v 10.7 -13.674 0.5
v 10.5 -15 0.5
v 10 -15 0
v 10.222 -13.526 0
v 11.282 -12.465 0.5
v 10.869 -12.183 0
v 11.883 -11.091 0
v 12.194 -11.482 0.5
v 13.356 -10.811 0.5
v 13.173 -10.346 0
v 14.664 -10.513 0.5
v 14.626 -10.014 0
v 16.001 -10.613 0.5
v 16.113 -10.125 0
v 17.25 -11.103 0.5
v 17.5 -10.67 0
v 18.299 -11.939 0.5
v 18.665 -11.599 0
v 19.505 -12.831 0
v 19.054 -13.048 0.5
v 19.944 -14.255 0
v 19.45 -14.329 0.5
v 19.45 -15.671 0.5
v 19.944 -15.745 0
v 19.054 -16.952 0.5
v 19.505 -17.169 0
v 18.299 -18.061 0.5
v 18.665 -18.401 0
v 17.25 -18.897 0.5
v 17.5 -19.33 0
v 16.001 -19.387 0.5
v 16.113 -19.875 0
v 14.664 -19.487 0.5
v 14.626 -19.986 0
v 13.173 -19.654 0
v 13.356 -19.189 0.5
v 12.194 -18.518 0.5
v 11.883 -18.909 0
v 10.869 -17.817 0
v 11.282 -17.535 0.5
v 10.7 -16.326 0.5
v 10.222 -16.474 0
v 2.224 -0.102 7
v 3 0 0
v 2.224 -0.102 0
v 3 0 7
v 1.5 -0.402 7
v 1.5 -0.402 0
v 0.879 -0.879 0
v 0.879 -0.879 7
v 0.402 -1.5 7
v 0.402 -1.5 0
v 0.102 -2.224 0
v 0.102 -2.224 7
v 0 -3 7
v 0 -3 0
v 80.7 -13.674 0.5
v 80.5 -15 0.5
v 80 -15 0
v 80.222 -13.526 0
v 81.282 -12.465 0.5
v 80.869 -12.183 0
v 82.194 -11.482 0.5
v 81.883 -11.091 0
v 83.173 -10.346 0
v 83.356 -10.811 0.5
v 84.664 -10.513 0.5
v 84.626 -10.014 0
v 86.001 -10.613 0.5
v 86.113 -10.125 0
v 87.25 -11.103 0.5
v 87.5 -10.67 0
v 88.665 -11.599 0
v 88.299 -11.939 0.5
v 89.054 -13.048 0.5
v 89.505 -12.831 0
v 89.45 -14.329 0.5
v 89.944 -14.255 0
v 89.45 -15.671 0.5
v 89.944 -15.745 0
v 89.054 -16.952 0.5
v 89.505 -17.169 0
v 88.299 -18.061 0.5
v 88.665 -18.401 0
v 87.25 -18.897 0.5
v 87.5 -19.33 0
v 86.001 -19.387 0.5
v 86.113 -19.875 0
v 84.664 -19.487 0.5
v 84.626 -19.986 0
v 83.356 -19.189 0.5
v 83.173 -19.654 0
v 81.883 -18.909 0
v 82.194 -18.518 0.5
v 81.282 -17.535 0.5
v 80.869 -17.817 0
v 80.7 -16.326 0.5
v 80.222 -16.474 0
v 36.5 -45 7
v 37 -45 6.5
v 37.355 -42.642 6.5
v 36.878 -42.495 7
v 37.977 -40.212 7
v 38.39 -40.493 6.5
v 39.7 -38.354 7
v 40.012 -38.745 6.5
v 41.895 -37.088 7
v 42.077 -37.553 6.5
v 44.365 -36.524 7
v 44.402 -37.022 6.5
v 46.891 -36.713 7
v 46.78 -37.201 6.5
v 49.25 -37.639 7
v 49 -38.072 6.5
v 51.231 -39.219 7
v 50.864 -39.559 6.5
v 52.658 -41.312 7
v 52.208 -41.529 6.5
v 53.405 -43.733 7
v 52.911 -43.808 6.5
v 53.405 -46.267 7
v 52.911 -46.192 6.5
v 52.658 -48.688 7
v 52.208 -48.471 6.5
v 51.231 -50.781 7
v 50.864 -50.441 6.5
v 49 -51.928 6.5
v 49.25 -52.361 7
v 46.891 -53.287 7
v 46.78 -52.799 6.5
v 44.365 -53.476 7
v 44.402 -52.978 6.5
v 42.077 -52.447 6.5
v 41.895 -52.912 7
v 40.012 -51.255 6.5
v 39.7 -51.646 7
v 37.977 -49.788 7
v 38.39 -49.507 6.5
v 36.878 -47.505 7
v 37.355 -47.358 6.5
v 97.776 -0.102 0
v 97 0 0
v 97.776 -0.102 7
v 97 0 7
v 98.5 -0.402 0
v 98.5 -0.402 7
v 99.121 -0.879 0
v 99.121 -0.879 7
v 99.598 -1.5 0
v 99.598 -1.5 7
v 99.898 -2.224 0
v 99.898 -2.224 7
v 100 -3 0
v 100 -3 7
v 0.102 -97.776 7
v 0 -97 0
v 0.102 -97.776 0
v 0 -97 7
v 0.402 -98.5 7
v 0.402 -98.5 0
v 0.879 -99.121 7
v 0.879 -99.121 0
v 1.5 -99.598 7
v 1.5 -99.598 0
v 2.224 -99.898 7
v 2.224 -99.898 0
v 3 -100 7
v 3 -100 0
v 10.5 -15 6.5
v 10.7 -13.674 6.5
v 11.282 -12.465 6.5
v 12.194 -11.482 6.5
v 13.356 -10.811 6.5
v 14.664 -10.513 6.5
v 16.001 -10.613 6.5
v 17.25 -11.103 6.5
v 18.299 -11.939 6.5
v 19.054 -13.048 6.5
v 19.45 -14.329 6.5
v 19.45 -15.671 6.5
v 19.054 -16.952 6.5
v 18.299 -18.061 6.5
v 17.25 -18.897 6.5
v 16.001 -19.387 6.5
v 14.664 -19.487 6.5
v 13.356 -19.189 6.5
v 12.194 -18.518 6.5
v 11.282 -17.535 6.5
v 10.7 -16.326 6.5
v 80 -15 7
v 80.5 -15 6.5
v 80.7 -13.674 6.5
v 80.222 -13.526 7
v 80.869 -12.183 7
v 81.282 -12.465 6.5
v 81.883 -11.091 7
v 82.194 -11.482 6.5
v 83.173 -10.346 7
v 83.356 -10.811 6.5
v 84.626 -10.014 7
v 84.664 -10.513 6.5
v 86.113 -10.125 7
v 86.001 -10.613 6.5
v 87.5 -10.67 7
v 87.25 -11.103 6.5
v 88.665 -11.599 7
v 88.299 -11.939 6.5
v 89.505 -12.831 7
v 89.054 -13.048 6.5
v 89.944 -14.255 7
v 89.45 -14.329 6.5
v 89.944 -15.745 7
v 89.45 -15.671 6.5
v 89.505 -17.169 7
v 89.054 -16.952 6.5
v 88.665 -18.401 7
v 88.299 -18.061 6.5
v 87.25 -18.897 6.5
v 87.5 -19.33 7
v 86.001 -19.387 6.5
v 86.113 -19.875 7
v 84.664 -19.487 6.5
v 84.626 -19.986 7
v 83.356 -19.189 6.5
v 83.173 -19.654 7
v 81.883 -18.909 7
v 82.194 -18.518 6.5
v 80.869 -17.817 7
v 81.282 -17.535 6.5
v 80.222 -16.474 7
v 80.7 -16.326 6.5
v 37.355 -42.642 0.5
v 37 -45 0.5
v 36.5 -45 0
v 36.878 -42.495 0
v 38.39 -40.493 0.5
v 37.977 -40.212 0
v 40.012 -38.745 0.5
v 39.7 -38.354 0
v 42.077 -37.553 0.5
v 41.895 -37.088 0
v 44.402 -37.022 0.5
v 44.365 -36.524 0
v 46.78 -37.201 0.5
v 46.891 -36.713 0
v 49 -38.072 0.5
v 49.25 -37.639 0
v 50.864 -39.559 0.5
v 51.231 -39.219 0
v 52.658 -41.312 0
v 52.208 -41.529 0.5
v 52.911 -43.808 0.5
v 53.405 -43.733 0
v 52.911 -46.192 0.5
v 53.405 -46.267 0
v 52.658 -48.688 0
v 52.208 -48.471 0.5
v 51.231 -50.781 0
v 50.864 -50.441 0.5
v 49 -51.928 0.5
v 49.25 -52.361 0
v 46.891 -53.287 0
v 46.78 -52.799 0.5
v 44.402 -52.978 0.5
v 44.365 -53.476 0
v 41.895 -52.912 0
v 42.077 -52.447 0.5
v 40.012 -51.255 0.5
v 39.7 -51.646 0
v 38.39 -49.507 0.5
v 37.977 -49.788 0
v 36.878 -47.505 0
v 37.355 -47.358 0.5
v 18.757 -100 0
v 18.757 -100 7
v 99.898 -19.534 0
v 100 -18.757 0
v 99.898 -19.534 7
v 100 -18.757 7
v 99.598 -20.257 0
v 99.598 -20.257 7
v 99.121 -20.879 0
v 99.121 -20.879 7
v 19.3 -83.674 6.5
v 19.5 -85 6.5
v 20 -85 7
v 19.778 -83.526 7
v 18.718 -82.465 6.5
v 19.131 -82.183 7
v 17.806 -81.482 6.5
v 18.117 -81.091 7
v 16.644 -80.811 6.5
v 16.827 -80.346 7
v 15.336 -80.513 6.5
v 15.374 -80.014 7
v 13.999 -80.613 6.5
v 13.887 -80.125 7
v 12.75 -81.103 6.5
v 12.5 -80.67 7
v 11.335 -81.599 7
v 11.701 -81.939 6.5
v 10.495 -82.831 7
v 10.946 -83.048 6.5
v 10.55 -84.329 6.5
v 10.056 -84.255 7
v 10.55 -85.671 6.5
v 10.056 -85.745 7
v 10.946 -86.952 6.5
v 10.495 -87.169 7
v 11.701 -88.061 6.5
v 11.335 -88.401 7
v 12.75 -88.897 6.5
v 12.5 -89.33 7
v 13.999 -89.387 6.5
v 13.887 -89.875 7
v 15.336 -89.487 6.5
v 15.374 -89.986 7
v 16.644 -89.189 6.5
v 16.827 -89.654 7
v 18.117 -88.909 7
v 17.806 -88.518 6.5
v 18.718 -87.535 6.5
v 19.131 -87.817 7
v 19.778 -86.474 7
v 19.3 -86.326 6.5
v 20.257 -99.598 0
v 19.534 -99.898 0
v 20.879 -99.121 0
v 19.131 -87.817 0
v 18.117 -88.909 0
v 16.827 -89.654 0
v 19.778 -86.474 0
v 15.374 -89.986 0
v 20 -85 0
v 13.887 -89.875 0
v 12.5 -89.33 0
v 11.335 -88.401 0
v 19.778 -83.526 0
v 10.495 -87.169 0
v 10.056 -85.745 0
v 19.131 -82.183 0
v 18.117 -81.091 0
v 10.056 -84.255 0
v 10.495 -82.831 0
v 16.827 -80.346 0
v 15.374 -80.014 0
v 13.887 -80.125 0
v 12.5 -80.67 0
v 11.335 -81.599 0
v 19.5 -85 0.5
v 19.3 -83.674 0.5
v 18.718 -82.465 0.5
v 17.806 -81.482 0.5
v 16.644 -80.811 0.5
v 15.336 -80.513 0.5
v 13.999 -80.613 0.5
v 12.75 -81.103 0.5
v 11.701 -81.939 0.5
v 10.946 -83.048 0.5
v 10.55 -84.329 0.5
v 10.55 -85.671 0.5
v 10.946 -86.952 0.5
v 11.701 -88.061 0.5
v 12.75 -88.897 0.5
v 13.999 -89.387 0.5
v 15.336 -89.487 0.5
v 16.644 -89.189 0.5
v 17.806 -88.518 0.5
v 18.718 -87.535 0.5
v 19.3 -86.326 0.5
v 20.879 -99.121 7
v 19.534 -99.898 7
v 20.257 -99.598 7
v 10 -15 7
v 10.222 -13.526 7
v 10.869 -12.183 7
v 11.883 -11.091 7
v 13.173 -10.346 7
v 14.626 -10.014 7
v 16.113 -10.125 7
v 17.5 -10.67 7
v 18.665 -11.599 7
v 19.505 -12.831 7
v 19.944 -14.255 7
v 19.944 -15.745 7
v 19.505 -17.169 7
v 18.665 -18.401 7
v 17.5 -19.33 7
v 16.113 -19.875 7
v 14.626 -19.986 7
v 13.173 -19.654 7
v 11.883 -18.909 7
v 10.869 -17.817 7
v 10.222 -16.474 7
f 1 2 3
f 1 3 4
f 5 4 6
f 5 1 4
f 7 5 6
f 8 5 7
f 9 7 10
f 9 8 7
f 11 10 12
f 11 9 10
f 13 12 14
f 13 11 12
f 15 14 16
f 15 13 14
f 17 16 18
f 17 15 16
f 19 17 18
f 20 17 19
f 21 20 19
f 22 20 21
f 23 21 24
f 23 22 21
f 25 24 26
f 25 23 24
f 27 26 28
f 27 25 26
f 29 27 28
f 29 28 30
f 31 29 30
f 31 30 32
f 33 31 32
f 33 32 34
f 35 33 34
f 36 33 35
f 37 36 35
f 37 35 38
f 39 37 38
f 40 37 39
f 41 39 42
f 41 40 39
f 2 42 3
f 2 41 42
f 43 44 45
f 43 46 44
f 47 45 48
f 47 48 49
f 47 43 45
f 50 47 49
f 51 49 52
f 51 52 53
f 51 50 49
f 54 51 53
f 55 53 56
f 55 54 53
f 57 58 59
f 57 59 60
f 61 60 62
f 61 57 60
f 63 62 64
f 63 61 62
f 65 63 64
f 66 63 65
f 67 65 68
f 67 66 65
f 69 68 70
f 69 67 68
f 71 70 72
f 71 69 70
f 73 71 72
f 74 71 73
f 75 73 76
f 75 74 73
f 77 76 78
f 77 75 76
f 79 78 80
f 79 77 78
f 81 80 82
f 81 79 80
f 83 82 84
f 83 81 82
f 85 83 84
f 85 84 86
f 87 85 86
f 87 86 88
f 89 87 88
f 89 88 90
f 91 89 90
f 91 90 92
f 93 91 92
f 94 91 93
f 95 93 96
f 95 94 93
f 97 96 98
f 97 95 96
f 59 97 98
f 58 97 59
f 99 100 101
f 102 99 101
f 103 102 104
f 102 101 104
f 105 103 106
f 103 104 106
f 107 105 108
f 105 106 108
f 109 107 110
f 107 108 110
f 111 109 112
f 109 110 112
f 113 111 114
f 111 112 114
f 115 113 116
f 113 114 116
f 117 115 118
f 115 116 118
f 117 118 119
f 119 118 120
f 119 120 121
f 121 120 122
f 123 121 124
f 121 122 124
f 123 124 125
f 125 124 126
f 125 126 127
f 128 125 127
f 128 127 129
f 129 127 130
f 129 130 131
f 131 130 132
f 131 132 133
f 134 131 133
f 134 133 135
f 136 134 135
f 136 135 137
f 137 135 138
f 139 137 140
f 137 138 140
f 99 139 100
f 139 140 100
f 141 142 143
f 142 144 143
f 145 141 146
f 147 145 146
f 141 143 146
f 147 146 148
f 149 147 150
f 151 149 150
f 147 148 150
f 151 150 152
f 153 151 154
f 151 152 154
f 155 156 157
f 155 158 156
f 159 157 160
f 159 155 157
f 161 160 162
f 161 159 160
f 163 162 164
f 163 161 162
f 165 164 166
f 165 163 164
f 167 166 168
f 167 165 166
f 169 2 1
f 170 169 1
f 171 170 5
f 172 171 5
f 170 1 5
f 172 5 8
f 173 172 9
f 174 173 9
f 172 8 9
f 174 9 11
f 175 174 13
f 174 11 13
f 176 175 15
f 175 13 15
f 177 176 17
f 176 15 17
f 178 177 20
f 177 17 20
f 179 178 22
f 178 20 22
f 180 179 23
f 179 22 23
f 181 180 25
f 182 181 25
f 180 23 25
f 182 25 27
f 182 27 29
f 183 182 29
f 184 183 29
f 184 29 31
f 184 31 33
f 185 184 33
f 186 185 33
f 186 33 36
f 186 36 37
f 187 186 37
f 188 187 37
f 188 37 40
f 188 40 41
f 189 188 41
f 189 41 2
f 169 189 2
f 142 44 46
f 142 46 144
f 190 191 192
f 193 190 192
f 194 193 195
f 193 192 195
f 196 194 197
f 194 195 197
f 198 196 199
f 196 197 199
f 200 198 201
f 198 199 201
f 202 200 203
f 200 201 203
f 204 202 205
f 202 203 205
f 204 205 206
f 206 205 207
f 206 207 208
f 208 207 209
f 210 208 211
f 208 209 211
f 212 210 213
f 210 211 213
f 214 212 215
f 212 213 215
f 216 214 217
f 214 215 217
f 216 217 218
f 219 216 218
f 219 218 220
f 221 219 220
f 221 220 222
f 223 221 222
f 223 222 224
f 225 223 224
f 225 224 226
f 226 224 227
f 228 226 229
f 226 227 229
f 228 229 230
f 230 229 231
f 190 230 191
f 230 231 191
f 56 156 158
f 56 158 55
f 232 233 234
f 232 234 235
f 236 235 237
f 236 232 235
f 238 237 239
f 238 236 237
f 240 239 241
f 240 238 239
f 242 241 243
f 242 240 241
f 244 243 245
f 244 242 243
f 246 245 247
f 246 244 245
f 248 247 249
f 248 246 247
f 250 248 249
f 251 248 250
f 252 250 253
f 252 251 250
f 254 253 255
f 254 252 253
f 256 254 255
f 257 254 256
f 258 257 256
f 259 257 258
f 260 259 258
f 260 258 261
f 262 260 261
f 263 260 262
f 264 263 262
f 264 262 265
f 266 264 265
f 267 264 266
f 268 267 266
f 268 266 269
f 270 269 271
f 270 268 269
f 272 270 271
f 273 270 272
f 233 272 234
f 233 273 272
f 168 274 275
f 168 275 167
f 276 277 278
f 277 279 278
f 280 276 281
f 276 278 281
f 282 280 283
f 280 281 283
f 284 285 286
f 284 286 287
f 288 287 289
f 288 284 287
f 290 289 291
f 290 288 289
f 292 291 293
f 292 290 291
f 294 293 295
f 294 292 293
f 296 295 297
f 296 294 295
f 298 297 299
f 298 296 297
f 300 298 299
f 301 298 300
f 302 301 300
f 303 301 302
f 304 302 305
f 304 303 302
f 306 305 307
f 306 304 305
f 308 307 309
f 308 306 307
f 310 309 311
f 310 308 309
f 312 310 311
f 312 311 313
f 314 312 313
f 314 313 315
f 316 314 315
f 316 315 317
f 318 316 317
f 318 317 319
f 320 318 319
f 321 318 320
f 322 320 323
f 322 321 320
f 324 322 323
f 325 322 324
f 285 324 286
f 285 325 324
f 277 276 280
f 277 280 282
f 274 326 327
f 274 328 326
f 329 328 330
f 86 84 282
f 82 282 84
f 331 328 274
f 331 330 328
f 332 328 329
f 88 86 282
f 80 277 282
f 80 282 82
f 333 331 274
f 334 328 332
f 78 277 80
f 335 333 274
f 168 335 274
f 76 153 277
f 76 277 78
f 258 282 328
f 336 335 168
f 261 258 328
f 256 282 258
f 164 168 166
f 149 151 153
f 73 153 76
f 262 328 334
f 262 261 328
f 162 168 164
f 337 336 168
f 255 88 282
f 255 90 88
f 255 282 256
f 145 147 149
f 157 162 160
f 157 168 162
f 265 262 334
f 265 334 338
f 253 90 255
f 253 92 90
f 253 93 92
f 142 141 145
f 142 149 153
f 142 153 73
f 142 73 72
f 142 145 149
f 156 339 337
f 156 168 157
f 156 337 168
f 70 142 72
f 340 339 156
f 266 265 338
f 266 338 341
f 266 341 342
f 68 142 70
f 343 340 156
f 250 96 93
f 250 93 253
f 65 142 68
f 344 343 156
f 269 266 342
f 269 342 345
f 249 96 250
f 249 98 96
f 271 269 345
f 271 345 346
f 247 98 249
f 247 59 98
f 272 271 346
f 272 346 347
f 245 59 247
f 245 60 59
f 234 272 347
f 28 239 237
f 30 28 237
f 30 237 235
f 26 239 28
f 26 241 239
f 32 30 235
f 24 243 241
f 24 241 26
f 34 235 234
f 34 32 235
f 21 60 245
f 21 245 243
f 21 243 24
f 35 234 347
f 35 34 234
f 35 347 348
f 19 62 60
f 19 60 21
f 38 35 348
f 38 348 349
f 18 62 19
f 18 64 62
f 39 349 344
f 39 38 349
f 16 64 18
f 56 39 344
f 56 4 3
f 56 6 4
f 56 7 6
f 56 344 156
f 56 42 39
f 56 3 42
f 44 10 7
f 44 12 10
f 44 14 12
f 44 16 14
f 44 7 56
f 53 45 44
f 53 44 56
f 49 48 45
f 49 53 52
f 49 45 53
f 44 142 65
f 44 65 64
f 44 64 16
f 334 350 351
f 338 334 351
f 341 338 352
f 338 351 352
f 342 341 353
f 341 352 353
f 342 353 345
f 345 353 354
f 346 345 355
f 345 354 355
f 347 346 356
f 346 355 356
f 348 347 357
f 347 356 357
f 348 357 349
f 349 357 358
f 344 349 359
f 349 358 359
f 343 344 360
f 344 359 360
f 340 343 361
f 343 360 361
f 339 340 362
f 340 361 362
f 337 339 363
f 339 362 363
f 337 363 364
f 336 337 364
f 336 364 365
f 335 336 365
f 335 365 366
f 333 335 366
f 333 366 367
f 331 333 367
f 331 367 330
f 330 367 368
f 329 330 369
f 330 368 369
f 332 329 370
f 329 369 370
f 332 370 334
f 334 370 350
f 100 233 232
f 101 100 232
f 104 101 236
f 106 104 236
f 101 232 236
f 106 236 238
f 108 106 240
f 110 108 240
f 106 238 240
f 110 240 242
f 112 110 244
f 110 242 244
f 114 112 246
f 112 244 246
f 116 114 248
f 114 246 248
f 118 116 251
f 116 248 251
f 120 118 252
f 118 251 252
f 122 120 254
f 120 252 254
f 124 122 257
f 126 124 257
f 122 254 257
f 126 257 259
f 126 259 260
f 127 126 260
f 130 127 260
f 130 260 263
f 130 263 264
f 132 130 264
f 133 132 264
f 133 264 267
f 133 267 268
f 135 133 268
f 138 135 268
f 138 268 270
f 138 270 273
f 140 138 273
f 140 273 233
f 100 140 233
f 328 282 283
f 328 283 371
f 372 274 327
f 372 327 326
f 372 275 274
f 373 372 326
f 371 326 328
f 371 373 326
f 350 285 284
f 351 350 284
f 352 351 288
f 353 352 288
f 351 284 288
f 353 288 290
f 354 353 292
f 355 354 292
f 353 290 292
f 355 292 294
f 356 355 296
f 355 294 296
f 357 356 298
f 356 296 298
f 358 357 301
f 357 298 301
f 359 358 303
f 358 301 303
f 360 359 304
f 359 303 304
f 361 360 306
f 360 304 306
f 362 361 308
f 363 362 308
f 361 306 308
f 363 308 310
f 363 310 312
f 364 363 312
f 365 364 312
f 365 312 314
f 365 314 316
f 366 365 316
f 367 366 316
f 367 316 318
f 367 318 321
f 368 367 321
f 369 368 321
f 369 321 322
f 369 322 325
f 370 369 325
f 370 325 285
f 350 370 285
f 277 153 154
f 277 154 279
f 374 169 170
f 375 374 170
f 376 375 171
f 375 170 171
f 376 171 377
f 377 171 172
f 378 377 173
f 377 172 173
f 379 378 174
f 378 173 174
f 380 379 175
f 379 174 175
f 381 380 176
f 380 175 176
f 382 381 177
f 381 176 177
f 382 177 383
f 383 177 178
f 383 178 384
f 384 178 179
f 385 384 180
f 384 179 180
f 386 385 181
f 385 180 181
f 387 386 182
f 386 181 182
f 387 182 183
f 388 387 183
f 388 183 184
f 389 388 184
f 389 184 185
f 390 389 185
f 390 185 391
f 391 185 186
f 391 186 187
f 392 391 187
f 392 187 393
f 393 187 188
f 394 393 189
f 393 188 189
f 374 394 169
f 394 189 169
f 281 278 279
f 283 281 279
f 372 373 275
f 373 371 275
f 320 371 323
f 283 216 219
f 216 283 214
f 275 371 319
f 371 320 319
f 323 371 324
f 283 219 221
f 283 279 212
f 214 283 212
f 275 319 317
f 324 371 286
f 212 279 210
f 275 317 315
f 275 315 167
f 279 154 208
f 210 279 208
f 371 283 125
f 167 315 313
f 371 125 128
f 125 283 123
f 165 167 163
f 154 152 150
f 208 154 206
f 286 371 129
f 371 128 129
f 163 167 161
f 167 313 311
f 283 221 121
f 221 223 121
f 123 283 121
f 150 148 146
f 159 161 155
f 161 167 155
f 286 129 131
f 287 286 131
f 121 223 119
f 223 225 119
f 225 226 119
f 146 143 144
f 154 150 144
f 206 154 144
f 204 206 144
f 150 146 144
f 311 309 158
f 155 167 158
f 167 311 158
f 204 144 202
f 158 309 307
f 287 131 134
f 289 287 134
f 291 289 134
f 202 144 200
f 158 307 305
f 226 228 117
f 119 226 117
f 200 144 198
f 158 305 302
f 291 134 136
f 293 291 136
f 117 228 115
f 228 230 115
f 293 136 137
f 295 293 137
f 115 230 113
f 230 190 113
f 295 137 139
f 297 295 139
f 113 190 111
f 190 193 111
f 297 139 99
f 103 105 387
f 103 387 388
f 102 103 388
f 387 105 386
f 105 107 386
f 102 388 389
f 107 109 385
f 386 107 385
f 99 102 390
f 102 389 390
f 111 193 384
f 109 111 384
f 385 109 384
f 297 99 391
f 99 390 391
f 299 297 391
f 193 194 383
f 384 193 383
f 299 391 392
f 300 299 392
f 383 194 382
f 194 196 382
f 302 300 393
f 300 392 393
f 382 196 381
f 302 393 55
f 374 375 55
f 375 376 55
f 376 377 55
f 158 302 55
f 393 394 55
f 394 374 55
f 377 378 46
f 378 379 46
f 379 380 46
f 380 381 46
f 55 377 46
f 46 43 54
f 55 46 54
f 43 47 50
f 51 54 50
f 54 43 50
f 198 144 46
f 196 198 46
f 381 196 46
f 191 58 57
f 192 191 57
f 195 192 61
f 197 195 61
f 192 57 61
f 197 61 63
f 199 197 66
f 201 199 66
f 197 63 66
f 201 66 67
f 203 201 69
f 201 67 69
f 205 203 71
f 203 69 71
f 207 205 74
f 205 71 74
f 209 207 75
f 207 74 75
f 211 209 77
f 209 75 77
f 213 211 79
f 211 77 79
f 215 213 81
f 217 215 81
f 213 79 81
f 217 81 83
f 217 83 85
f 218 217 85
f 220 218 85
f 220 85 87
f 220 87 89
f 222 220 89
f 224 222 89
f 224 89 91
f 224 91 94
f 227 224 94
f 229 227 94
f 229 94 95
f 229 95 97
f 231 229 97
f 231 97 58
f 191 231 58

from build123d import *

# Parameters (mm, degrees)
BOSS_EXTRUDE1_DEPTH        = 7
F_9_0_9_DIAMETER_HOLE1_D   = 9
F_16_0_16_DIAMETER_HOLE1_D = 16
F_9_0_9_DIAMETER_HOLE2_D   = 9
CHAMFER1_SIZE              = 0.5
FILLET1_R                  = 3


with BuildPart() as part:
    # Sketch1 → Boss-Extrude1 (new body)
    with BuildSketch(Plane(origin=(0, 0, 0), x_dir=(-1, 0, 0), z_dir=(0, 0, -1))):
        Polygon((0, 0), (-100, 0), (-100, -20), (-20, -100), (0, -100), align=None)
    extrude(amount=-BOSS_EXTRUDE1_DEPTH)

    # Ø9.0 (9) Diameter Hole1 (through all)
    with Locations(Plane.XY.offset(7)):
        with Locations((85, -15), (15, -15)):
            Hole(F_9_0_9_DIAMETER_HOLE1_D / 2)

    # Ø16.0 (16) Diameter Hole1 (through all)
    with Locations(Plane.XY.offset(7)):
        with Locations((45, -45)):
            Hole(F_16_0_16_DIAMETER_HOLE1_D / 2)

    # Ø9.0 (9) Diameter Hole2 (through all)
    with Locations(Plane(origin=(0, 0, 0), x_dir=(-1, 0, 0), z_dir=(0, 0, -1))):
        with Locations((-15, -85)):
            Hole(F_9_0_9_DIAMETER_HOLE2_D / 2)

    # Chamfer1
    chamfer1_edges = [part.edges().sort_by_distance(p)[0] for p in [
        (19.5, -15, 7),
        (19.5, -15, 0),
        (89.5, -15, 7),
        (89.5, -15, 0),
        (53, -45, 7),
        (53, -45, 0),
        (10.5, -85, 0),
        (10.5, -85, 7),
    ]]
    chamfer(chamfer1_edges, length=CHAMFER1_SIZE)

    # Fillet1
    fillet1_edges = [part.edges().sort_by_distance(p)[0] for p in [
        (0, -100, 3.5),
        (20, -100, 3.5),
        (100, -20, 3.5),
        (100, 0, 3.5),
        (0, 0, 3.5),
    ]]
    fillet(fillet1_edges, radius=FILLET1_R)


solid = part.part
